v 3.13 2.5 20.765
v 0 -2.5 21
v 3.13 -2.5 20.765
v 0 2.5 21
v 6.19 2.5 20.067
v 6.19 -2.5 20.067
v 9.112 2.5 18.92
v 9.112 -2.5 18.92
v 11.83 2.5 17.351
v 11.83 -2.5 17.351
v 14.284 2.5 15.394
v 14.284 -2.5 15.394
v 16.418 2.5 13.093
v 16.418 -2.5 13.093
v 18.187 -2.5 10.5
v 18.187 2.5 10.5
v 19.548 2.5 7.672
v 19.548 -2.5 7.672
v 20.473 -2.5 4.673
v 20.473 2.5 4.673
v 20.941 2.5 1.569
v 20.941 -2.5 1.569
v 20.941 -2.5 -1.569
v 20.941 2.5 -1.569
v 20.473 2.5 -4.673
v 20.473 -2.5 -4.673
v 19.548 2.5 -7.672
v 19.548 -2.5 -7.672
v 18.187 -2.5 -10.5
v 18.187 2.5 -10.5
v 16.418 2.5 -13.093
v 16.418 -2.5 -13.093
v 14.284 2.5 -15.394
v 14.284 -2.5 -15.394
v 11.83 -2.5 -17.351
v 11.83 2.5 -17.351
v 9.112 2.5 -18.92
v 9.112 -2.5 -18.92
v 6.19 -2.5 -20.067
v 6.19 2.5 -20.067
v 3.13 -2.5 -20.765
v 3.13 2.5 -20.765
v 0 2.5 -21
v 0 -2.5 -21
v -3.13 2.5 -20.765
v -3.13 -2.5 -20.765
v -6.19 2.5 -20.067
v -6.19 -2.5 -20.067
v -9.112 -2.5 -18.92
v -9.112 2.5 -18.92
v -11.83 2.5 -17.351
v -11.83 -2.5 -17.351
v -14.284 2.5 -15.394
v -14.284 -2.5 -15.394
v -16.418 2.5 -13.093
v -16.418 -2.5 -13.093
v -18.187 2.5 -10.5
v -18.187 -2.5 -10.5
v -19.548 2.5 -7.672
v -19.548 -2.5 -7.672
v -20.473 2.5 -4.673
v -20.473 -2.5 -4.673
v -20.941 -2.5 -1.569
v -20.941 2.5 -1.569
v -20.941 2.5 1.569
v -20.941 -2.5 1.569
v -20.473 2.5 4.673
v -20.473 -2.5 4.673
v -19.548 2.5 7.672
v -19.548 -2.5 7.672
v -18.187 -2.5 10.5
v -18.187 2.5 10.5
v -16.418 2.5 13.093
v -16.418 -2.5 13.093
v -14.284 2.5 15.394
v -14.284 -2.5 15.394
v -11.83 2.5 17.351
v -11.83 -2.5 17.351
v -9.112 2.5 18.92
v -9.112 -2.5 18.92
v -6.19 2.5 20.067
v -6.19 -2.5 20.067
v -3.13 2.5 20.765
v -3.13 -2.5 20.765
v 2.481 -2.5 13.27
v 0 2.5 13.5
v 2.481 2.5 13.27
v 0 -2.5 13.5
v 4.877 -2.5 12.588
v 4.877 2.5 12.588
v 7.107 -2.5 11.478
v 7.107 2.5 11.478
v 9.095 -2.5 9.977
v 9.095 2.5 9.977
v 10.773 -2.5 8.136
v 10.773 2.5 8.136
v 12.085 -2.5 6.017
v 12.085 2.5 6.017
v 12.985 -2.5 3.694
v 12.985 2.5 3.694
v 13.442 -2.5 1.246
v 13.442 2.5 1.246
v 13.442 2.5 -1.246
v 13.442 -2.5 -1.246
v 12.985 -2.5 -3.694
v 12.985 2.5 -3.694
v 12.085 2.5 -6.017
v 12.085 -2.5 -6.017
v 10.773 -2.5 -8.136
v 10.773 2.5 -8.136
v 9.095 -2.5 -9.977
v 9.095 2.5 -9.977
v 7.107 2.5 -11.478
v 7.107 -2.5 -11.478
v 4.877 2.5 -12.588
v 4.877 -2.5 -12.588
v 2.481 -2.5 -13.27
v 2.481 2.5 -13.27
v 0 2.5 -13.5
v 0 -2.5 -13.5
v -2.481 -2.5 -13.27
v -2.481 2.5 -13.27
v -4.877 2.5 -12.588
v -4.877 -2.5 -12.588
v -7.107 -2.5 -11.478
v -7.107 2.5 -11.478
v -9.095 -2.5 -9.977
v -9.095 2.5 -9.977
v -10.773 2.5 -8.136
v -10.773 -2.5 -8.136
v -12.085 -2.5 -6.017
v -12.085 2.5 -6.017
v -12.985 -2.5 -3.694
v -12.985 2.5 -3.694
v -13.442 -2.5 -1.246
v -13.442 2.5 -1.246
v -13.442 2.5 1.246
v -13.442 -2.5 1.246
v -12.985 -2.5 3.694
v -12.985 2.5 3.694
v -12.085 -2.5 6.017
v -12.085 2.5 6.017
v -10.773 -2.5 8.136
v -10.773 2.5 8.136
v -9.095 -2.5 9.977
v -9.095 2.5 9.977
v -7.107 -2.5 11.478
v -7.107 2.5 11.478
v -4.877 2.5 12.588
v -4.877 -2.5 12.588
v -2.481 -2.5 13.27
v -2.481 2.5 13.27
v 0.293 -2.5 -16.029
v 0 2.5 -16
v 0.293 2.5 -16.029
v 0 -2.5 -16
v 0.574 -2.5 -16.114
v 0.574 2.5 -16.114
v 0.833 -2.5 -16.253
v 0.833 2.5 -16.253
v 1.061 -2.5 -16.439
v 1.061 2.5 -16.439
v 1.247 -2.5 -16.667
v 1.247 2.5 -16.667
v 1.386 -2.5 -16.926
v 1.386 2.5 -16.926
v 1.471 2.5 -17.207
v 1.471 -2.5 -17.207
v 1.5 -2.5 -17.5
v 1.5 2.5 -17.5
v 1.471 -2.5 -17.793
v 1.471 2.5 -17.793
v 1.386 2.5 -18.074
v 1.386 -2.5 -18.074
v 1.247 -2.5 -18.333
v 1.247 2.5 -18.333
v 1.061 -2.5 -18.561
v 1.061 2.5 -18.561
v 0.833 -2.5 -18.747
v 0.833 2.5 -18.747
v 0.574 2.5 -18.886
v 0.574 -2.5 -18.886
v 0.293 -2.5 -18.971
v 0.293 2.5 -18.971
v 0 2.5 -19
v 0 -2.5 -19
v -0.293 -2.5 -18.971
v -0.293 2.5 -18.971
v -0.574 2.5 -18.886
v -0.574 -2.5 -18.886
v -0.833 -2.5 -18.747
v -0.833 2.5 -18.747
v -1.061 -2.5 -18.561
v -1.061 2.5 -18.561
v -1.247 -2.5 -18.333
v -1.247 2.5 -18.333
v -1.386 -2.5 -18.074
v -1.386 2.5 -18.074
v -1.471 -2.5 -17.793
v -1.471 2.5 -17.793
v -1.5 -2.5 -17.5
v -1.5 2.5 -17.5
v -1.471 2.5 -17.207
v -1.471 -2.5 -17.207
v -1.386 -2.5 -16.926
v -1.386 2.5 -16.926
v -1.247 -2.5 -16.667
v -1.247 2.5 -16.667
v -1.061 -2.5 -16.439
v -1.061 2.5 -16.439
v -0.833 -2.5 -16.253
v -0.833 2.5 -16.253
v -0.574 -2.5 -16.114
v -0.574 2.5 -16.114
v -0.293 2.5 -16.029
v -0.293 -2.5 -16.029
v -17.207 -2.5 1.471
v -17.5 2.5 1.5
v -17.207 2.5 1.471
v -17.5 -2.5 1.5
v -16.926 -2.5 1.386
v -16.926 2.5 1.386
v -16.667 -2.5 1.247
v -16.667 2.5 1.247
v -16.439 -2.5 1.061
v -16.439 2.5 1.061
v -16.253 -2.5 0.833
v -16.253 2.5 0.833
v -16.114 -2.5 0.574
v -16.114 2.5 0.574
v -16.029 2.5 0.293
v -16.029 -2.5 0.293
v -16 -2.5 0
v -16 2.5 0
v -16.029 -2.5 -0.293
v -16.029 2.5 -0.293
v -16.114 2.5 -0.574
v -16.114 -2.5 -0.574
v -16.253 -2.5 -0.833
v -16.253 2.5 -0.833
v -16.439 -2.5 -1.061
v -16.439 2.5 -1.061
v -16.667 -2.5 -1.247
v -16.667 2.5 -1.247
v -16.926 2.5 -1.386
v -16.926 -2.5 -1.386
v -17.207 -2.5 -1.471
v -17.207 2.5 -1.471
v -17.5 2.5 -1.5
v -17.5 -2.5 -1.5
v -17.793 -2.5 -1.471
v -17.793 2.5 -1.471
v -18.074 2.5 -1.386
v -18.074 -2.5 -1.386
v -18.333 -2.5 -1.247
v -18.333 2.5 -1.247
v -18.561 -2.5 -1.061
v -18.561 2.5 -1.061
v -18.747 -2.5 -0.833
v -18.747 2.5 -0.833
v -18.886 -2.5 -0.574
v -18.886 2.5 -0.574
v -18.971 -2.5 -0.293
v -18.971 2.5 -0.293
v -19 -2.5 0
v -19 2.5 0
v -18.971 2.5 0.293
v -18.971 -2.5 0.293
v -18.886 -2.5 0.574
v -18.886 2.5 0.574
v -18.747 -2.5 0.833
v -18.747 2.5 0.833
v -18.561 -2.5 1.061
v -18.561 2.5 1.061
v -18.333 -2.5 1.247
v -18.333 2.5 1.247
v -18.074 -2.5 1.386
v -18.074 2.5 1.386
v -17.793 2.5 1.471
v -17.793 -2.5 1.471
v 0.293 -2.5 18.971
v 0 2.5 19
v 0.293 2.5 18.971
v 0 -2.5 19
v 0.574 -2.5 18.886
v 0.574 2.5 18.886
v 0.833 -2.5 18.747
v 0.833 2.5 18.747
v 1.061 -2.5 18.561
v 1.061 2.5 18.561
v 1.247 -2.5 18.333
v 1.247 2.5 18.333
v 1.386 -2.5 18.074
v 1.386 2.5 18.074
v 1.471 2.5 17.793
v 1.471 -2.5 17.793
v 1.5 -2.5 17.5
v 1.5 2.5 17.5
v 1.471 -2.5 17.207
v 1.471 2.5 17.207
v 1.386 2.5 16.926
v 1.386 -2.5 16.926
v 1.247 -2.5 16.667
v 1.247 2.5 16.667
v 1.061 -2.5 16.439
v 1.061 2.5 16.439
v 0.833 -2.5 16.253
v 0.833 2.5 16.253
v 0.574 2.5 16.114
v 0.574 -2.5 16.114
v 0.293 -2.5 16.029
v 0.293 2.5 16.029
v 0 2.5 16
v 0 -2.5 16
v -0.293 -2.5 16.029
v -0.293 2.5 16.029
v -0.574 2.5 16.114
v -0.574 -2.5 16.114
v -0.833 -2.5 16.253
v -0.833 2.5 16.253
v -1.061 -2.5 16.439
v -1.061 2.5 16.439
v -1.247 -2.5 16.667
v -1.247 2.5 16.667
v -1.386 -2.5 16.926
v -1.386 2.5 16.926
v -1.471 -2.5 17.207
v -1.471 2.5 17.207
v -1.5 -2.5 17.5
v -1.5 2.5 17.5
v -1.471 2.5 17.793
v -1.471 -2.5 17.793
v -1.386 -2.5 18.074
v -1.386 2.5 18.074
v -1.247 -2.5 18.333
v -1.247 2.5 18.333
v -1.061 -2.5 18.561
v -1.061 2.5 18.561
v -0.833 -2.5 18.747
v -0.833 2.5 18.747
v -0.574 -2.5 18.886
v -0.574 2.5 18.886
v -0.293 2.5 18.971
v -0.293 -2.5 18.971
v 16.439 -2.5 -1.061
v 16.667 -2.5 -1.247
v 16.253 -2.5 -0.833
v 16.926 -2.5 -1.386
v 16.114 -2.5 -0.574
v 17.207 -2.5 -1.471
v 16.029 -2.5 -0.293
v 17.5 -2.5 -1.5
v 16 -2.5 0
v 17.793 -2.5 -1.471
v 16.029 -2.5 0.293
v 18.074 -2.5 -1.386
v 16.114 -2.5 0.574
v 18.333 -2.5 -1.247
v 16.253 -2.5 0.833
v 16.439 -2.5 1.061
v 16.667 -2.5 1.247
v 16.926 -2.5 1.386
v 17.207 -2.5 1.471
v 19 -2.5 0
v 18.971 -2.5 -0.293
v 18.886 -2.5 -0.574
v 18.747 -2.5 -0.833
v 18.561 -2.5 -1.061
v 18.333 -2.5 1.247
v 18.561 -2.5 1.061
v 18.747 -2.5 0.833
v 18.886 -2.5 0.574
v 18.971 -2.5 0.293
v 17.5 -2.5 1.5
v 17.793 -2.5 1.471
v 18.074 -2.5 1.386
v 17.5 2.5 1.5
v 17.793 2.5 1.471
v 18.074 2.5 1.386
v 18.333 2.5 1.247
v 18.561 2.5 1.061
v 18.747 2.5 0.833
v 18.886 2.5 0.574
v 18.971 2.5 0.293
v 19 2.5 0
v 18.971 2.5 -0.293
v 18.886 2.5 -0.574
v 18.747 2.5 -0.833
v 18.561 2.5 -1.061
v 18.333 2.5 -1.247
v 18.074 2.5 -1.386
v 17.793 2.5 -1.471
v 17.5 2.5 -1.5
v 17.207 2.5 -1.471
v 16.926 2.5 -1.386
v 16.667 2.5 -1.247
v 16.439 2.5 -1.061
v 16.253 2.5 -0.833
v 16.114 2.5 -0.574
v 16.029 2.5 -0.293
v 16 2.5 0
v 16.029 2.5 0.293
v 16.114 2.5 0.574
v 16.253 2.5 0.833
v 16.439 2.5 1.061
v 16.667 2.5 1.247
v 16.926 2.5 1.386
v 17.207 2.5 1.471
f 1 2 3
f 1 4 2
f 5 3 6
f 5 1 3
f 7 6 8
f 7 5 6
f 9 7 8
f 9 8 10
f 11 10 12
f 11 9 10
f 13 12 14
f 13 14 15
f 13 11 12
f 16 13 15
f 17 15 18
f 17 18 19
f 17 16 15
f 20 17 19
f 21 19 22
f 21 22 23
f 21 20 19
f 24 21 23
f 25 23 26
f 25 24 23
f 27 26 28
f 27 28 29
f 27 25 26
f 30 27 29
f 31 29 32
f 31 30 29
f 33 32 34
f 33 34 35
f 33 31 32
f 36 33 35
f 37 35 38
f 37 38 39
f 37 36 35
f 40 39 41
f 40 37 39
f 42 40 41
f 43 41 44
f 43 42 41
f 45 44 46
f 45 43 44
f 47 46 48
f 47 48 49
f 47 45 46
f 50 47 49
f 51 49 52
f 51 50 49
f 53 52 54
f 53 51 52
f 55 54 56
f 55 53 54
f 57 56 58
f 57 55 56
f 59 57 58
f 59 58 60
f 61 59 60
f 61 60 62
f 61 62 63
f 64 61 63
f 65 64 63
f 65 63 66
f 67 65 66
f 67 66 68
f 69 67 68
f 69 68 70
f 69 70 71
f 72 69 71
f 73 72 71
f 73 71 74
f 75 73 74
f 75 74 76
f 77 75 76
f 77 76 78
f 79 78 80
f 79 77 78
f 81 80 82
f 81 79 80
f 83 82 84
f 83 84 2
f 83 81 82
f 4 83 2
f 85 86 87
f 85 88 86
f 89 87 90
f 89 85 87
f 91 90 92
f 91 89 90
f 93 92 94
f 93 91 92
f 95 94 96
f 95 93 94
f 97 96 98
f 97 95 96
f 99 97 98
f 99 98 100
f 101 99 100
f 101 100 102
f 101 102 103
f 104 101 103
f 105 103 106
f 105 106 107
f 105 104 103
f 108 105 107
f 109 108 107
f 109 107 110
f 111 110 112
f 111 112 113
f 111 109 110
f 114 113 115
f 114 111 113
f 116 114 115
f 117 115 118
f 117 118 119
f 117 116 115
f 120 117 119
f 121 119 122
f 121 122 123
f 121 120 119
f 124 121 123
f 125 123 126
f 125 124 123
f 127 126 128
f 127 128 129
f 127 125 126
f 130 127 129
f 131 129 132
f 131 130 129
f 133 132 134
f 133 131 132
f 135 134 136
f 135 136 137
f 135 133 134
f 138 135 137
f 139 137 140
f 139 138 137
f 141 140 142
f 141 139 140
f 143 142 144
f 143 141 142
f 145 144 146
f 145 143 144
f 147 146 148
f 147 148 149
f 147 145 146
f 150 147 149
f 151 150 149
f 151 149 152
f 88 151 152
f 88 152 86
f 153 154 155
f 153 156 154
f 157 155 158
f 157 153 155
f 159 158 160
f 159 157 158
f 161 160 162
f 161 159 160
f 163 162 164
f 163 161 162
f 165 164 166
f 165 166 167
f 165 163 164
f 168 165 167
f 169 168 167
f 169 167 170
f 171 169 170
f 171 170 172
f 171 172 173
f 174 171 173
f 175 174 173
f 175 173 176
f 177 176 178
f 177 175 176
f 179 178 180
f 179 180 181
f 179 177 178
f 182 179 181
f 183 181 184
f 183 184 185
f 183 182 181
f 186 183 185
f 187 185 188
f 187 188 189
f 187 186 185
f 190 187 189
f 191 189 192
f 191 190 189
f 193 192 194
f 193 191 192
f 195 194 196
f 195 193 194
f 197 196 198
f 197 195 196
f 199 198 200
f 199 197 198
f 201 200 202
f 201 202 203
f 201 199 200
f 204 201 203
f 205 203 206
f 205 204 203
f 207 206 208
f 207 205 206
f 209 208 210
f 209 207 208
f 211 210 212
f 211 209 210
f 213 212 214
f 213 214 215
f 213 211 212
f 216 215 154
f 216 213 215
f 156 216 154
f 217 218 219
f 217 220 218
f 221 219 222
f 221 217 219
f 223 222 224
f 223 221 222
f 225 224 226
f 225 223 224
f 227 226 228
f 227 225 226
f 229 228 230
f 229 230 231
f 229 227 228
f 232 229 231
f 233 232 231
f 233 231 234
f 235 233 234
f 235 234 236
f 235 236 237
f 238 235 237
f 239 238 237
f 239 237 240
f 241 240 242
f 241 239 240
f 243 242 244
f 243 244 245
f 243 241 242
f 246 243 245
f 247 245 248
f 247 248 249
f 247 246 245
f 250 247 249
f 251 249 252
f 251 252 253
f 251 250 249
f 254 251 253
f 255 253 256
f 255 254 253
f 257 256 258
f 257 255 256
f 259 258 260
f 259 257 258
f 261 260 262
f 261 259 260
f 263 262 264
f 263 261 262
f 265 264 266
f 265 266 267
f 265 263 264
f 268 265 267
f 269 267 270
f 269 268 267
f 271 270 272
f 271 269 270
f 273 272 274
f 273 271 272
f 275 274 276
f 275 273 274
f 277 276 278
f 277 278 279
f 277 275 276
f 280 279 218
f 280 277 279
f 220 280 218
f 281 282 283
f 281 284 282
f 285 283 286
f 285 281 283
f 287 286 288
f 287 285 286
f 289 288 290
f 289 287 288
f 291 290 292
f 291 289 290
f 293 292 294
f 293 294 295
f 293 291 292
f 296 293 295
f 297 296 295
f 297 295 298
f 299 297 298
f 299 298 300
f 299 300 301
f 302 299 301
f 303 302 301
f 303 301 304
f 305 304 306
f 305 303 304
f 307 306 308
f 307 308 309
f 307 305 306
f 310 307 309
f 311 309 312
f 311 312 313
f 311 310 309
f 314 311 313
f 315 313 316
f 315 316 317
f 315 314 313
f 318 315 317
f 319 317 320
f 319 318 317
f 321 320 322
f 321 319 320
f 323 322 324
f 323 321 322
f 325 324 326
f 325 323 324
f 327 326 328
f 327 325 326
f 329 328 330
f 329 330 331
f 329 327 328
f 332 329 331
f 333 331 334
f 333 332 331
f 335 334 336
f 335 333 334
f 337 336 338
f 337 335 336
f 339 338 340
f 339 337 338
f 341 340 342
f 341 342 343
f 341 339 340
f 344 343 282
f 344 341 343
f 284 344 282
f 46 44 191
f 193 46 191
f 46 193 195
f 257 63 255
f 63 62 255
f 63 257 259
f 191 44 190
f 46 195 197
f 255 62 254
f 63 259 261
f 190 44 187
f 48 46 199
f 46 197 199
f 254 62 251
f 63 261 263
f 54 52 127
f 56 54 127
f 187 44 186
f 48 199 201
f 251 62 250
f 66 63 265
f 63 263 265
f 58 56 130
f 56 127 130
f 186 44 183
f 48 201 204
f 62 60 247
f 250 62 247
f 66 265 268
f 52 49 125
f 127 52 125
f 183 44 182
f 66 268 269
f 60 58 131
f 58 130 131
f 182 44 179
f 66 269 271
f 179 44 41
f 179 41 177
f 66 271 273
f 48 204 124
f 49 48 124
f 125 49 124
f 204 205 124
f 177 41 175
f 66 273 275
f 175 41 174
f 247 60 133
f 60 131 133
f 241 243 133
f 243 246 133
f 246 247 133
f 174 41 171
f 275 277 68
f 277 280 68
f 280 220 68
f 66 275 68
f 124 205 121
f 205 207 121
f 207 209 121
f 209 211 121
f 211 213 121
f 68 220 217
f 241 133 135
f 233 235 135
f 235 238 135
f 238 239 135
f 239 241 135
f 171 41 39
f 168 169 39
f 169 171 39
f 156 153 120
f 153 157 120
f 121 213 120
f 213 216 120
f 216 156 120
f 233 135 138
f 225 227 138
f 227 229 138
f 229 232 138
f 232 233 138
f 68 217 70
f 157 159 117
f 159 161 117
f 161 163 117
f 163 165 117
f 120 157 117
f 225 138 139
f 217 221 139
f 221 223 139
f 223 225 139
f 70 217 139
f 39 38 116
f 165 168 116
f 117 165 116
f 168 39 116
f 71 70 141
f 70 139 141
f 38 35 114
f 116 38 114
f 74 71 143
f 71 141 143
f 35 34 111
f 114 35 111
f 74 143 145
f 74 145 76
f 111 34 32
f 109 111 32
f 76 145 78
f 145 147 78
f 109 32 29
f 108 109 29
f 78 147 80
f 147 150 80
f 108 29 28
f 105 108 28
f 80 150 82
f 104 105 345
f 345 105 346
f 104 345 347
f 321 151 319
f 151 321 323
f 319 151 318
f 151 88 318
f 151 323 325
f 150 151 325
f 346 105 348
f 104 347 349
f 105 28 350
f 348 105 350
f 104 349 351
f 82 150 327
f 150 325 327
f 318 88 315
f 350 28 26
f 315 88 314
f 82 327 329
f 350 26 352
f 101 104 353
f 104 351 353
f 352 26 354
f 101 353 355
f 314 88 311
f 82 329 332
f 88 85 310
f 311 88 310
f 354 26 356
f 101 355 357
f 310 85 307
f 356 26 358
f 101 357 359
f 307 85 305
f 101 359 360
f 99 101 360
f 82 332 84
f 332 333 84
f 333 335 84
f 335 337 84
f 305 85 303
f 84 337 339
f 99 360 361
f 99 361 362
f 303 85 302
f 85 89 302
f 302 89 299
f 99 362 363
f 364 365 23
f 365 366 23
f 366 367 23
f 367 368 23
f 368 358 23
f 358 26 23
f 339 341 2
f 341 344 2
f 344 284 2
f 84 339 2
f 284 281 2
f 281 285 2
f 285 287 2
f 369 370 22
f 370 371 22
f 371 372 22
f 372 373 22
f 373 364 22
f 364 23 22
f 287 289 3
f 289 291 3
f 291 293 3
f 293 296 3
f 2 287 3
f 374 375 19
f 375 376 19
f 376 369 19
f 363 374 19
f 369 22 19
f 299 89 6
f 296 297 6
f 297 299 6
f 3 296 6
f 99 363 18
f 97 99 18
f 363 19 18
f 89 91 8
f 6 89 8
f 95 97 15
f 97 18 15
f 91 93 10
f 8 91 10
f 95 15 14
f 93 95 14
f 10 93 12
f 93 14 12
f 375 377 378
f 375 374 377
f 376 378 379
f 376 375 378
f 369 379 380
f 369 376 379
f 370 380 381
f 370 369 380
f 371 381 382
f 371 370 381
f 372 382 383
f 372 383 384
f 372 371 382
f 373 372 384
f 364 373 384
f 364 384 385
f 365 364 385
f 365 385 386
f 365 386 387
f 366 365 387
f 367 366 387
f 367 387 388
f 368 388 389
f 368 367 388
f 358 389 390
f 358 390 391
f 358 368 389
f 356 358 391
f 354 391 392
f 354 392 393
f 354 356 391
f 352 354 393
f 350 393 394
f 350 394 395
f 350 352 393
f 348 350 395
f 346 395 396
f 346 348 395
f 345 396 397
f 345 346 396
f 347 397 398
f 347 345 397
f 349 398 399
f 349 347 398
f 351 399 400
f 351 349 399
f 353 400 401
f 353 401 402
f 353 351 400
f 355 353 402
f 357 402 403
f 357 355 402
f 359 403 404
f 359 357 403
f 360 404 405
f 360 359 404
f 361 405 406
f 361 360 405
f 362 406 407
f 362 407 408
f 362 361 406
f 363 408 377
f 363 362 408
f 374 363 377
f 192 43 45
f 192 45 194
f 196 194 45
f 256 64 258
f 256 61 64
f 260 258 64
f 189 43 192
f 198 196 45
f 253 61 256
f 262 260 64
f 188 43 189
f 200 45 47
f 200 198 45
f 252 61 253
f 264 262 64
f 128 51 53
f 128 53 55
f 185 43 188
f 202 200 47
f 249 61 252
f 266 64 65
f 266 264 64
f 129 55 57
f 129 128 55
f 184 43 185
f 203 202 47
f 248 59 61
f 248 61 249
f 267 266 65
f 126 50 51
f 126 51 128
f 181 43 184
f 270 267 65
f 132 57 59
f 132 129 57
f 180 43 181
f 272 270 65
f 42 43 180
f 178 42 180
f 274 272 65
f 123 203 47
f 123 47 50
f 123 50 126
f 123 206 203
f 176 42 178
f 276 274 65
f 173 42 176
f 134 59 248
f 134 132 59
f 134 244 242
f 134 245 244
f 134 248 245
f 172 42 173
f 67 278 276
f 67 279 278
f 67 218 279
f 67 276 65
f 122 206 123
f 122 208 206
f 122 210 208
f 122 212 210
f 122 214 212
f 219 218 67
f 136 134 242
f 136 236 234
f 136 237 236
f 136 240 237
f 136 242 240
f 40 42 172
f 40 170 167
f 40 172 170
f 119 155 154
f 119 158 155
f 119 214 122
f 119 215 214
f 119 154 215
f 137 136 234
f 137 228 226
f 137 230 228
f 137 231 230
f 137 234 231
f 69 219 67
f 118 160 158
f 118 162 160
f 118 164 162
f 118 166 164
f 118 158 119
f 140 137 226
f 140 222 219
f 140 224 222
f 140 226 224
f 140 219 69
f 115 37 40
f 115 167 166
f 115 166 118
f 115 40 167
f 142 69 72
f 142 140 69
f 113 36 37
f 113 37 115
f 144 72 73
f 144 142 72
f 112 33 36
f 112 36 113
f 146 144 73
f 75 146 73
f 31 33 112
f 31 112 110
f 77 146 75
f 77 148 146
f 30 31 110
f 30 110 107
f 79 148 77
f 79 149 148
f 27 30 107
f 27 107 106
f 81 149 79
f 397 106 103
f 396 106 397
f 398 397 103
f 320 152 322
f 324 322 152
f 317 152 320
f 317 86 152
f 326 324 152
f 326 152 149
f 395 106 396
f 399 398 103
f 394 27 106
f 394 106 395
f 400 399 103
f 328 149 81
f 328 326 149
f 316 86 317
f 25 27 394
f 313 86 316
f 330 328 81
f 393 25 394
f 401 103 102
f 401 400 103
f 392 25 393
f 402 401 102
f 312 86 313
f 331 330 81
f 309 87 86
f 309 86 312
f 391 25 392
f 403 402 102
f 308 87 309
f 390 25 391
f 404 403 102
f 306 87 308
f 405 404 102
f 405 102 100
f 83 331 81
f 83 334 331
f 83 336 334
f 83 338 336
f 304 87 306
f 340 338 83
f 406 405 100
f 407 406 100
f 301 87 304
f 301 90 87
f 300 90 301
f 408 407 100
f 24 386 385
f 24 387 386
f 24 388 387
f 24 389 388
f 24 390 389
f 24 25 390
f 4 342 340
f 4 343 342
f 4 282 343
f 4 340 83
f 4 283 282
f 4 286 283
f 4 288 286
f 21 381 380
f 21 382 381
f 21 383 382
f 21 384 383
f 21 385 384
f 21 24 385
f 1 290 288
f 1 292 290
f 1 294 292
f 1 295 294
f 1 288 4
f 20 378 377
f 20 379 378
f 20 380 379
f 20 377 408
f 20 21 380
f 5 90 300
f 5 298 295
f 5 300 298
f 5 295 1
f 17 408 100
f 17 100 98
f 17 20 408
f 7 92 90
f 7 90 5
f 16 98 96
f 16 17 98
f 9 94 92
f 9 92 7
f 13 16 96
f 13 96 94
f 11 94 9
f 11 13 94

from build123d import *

# Parameters (mm, degrees)
SKETCH_1_R      = 21
SKETCH_1_R_2    = 13.5
SKETCH_1_R_3    = 1.5
EXTRUDE_1_DEPTH = 2.5


with BuildPart() as part:
    # 草图1 → 凸台-拉伸1 (new, symmetric)
    with BuildSketch(Plane(origin=(0, 0, 0), x_dir=(1, 0, 0), z_dir=(0, 1, 0))):
        with Locations(Location((0, 0, 0), (0, 0, 270))):
            Circle(SKETCH_1_R)
        with Locations(Location((0, 0, 0), (0, 0, 270))):
            Circle(SKETCH_1_R_2, mode=Mode.SUBTRACT)
        with Locations(Location((0, 17.5, 0), (0, 0, 270))):
            Circle(SKETCH_1_R_3, mode=Mode.SUBTRACT)
        with Locations(Location((17.5, 0, 0), (0, 0, 270))):
            Circle(SKETCH_1_R_3, mode=Mode.SUBTRACT)
        with Locations(Location((0, -17.5, 0), (0, 0, 270))):
            Circle(SKETCH_1_R_3, mode=Mode.SUBTRACT)
        with Locations(Location((-17.5, 0, 0), (0, 0, 270))):
            Circle(SKETCH_1_R_3, mode=Mode.SUBTRACT)
    extrude(amount=EXTRUDE_1_DEPTH, both=True)


solid = part.part
